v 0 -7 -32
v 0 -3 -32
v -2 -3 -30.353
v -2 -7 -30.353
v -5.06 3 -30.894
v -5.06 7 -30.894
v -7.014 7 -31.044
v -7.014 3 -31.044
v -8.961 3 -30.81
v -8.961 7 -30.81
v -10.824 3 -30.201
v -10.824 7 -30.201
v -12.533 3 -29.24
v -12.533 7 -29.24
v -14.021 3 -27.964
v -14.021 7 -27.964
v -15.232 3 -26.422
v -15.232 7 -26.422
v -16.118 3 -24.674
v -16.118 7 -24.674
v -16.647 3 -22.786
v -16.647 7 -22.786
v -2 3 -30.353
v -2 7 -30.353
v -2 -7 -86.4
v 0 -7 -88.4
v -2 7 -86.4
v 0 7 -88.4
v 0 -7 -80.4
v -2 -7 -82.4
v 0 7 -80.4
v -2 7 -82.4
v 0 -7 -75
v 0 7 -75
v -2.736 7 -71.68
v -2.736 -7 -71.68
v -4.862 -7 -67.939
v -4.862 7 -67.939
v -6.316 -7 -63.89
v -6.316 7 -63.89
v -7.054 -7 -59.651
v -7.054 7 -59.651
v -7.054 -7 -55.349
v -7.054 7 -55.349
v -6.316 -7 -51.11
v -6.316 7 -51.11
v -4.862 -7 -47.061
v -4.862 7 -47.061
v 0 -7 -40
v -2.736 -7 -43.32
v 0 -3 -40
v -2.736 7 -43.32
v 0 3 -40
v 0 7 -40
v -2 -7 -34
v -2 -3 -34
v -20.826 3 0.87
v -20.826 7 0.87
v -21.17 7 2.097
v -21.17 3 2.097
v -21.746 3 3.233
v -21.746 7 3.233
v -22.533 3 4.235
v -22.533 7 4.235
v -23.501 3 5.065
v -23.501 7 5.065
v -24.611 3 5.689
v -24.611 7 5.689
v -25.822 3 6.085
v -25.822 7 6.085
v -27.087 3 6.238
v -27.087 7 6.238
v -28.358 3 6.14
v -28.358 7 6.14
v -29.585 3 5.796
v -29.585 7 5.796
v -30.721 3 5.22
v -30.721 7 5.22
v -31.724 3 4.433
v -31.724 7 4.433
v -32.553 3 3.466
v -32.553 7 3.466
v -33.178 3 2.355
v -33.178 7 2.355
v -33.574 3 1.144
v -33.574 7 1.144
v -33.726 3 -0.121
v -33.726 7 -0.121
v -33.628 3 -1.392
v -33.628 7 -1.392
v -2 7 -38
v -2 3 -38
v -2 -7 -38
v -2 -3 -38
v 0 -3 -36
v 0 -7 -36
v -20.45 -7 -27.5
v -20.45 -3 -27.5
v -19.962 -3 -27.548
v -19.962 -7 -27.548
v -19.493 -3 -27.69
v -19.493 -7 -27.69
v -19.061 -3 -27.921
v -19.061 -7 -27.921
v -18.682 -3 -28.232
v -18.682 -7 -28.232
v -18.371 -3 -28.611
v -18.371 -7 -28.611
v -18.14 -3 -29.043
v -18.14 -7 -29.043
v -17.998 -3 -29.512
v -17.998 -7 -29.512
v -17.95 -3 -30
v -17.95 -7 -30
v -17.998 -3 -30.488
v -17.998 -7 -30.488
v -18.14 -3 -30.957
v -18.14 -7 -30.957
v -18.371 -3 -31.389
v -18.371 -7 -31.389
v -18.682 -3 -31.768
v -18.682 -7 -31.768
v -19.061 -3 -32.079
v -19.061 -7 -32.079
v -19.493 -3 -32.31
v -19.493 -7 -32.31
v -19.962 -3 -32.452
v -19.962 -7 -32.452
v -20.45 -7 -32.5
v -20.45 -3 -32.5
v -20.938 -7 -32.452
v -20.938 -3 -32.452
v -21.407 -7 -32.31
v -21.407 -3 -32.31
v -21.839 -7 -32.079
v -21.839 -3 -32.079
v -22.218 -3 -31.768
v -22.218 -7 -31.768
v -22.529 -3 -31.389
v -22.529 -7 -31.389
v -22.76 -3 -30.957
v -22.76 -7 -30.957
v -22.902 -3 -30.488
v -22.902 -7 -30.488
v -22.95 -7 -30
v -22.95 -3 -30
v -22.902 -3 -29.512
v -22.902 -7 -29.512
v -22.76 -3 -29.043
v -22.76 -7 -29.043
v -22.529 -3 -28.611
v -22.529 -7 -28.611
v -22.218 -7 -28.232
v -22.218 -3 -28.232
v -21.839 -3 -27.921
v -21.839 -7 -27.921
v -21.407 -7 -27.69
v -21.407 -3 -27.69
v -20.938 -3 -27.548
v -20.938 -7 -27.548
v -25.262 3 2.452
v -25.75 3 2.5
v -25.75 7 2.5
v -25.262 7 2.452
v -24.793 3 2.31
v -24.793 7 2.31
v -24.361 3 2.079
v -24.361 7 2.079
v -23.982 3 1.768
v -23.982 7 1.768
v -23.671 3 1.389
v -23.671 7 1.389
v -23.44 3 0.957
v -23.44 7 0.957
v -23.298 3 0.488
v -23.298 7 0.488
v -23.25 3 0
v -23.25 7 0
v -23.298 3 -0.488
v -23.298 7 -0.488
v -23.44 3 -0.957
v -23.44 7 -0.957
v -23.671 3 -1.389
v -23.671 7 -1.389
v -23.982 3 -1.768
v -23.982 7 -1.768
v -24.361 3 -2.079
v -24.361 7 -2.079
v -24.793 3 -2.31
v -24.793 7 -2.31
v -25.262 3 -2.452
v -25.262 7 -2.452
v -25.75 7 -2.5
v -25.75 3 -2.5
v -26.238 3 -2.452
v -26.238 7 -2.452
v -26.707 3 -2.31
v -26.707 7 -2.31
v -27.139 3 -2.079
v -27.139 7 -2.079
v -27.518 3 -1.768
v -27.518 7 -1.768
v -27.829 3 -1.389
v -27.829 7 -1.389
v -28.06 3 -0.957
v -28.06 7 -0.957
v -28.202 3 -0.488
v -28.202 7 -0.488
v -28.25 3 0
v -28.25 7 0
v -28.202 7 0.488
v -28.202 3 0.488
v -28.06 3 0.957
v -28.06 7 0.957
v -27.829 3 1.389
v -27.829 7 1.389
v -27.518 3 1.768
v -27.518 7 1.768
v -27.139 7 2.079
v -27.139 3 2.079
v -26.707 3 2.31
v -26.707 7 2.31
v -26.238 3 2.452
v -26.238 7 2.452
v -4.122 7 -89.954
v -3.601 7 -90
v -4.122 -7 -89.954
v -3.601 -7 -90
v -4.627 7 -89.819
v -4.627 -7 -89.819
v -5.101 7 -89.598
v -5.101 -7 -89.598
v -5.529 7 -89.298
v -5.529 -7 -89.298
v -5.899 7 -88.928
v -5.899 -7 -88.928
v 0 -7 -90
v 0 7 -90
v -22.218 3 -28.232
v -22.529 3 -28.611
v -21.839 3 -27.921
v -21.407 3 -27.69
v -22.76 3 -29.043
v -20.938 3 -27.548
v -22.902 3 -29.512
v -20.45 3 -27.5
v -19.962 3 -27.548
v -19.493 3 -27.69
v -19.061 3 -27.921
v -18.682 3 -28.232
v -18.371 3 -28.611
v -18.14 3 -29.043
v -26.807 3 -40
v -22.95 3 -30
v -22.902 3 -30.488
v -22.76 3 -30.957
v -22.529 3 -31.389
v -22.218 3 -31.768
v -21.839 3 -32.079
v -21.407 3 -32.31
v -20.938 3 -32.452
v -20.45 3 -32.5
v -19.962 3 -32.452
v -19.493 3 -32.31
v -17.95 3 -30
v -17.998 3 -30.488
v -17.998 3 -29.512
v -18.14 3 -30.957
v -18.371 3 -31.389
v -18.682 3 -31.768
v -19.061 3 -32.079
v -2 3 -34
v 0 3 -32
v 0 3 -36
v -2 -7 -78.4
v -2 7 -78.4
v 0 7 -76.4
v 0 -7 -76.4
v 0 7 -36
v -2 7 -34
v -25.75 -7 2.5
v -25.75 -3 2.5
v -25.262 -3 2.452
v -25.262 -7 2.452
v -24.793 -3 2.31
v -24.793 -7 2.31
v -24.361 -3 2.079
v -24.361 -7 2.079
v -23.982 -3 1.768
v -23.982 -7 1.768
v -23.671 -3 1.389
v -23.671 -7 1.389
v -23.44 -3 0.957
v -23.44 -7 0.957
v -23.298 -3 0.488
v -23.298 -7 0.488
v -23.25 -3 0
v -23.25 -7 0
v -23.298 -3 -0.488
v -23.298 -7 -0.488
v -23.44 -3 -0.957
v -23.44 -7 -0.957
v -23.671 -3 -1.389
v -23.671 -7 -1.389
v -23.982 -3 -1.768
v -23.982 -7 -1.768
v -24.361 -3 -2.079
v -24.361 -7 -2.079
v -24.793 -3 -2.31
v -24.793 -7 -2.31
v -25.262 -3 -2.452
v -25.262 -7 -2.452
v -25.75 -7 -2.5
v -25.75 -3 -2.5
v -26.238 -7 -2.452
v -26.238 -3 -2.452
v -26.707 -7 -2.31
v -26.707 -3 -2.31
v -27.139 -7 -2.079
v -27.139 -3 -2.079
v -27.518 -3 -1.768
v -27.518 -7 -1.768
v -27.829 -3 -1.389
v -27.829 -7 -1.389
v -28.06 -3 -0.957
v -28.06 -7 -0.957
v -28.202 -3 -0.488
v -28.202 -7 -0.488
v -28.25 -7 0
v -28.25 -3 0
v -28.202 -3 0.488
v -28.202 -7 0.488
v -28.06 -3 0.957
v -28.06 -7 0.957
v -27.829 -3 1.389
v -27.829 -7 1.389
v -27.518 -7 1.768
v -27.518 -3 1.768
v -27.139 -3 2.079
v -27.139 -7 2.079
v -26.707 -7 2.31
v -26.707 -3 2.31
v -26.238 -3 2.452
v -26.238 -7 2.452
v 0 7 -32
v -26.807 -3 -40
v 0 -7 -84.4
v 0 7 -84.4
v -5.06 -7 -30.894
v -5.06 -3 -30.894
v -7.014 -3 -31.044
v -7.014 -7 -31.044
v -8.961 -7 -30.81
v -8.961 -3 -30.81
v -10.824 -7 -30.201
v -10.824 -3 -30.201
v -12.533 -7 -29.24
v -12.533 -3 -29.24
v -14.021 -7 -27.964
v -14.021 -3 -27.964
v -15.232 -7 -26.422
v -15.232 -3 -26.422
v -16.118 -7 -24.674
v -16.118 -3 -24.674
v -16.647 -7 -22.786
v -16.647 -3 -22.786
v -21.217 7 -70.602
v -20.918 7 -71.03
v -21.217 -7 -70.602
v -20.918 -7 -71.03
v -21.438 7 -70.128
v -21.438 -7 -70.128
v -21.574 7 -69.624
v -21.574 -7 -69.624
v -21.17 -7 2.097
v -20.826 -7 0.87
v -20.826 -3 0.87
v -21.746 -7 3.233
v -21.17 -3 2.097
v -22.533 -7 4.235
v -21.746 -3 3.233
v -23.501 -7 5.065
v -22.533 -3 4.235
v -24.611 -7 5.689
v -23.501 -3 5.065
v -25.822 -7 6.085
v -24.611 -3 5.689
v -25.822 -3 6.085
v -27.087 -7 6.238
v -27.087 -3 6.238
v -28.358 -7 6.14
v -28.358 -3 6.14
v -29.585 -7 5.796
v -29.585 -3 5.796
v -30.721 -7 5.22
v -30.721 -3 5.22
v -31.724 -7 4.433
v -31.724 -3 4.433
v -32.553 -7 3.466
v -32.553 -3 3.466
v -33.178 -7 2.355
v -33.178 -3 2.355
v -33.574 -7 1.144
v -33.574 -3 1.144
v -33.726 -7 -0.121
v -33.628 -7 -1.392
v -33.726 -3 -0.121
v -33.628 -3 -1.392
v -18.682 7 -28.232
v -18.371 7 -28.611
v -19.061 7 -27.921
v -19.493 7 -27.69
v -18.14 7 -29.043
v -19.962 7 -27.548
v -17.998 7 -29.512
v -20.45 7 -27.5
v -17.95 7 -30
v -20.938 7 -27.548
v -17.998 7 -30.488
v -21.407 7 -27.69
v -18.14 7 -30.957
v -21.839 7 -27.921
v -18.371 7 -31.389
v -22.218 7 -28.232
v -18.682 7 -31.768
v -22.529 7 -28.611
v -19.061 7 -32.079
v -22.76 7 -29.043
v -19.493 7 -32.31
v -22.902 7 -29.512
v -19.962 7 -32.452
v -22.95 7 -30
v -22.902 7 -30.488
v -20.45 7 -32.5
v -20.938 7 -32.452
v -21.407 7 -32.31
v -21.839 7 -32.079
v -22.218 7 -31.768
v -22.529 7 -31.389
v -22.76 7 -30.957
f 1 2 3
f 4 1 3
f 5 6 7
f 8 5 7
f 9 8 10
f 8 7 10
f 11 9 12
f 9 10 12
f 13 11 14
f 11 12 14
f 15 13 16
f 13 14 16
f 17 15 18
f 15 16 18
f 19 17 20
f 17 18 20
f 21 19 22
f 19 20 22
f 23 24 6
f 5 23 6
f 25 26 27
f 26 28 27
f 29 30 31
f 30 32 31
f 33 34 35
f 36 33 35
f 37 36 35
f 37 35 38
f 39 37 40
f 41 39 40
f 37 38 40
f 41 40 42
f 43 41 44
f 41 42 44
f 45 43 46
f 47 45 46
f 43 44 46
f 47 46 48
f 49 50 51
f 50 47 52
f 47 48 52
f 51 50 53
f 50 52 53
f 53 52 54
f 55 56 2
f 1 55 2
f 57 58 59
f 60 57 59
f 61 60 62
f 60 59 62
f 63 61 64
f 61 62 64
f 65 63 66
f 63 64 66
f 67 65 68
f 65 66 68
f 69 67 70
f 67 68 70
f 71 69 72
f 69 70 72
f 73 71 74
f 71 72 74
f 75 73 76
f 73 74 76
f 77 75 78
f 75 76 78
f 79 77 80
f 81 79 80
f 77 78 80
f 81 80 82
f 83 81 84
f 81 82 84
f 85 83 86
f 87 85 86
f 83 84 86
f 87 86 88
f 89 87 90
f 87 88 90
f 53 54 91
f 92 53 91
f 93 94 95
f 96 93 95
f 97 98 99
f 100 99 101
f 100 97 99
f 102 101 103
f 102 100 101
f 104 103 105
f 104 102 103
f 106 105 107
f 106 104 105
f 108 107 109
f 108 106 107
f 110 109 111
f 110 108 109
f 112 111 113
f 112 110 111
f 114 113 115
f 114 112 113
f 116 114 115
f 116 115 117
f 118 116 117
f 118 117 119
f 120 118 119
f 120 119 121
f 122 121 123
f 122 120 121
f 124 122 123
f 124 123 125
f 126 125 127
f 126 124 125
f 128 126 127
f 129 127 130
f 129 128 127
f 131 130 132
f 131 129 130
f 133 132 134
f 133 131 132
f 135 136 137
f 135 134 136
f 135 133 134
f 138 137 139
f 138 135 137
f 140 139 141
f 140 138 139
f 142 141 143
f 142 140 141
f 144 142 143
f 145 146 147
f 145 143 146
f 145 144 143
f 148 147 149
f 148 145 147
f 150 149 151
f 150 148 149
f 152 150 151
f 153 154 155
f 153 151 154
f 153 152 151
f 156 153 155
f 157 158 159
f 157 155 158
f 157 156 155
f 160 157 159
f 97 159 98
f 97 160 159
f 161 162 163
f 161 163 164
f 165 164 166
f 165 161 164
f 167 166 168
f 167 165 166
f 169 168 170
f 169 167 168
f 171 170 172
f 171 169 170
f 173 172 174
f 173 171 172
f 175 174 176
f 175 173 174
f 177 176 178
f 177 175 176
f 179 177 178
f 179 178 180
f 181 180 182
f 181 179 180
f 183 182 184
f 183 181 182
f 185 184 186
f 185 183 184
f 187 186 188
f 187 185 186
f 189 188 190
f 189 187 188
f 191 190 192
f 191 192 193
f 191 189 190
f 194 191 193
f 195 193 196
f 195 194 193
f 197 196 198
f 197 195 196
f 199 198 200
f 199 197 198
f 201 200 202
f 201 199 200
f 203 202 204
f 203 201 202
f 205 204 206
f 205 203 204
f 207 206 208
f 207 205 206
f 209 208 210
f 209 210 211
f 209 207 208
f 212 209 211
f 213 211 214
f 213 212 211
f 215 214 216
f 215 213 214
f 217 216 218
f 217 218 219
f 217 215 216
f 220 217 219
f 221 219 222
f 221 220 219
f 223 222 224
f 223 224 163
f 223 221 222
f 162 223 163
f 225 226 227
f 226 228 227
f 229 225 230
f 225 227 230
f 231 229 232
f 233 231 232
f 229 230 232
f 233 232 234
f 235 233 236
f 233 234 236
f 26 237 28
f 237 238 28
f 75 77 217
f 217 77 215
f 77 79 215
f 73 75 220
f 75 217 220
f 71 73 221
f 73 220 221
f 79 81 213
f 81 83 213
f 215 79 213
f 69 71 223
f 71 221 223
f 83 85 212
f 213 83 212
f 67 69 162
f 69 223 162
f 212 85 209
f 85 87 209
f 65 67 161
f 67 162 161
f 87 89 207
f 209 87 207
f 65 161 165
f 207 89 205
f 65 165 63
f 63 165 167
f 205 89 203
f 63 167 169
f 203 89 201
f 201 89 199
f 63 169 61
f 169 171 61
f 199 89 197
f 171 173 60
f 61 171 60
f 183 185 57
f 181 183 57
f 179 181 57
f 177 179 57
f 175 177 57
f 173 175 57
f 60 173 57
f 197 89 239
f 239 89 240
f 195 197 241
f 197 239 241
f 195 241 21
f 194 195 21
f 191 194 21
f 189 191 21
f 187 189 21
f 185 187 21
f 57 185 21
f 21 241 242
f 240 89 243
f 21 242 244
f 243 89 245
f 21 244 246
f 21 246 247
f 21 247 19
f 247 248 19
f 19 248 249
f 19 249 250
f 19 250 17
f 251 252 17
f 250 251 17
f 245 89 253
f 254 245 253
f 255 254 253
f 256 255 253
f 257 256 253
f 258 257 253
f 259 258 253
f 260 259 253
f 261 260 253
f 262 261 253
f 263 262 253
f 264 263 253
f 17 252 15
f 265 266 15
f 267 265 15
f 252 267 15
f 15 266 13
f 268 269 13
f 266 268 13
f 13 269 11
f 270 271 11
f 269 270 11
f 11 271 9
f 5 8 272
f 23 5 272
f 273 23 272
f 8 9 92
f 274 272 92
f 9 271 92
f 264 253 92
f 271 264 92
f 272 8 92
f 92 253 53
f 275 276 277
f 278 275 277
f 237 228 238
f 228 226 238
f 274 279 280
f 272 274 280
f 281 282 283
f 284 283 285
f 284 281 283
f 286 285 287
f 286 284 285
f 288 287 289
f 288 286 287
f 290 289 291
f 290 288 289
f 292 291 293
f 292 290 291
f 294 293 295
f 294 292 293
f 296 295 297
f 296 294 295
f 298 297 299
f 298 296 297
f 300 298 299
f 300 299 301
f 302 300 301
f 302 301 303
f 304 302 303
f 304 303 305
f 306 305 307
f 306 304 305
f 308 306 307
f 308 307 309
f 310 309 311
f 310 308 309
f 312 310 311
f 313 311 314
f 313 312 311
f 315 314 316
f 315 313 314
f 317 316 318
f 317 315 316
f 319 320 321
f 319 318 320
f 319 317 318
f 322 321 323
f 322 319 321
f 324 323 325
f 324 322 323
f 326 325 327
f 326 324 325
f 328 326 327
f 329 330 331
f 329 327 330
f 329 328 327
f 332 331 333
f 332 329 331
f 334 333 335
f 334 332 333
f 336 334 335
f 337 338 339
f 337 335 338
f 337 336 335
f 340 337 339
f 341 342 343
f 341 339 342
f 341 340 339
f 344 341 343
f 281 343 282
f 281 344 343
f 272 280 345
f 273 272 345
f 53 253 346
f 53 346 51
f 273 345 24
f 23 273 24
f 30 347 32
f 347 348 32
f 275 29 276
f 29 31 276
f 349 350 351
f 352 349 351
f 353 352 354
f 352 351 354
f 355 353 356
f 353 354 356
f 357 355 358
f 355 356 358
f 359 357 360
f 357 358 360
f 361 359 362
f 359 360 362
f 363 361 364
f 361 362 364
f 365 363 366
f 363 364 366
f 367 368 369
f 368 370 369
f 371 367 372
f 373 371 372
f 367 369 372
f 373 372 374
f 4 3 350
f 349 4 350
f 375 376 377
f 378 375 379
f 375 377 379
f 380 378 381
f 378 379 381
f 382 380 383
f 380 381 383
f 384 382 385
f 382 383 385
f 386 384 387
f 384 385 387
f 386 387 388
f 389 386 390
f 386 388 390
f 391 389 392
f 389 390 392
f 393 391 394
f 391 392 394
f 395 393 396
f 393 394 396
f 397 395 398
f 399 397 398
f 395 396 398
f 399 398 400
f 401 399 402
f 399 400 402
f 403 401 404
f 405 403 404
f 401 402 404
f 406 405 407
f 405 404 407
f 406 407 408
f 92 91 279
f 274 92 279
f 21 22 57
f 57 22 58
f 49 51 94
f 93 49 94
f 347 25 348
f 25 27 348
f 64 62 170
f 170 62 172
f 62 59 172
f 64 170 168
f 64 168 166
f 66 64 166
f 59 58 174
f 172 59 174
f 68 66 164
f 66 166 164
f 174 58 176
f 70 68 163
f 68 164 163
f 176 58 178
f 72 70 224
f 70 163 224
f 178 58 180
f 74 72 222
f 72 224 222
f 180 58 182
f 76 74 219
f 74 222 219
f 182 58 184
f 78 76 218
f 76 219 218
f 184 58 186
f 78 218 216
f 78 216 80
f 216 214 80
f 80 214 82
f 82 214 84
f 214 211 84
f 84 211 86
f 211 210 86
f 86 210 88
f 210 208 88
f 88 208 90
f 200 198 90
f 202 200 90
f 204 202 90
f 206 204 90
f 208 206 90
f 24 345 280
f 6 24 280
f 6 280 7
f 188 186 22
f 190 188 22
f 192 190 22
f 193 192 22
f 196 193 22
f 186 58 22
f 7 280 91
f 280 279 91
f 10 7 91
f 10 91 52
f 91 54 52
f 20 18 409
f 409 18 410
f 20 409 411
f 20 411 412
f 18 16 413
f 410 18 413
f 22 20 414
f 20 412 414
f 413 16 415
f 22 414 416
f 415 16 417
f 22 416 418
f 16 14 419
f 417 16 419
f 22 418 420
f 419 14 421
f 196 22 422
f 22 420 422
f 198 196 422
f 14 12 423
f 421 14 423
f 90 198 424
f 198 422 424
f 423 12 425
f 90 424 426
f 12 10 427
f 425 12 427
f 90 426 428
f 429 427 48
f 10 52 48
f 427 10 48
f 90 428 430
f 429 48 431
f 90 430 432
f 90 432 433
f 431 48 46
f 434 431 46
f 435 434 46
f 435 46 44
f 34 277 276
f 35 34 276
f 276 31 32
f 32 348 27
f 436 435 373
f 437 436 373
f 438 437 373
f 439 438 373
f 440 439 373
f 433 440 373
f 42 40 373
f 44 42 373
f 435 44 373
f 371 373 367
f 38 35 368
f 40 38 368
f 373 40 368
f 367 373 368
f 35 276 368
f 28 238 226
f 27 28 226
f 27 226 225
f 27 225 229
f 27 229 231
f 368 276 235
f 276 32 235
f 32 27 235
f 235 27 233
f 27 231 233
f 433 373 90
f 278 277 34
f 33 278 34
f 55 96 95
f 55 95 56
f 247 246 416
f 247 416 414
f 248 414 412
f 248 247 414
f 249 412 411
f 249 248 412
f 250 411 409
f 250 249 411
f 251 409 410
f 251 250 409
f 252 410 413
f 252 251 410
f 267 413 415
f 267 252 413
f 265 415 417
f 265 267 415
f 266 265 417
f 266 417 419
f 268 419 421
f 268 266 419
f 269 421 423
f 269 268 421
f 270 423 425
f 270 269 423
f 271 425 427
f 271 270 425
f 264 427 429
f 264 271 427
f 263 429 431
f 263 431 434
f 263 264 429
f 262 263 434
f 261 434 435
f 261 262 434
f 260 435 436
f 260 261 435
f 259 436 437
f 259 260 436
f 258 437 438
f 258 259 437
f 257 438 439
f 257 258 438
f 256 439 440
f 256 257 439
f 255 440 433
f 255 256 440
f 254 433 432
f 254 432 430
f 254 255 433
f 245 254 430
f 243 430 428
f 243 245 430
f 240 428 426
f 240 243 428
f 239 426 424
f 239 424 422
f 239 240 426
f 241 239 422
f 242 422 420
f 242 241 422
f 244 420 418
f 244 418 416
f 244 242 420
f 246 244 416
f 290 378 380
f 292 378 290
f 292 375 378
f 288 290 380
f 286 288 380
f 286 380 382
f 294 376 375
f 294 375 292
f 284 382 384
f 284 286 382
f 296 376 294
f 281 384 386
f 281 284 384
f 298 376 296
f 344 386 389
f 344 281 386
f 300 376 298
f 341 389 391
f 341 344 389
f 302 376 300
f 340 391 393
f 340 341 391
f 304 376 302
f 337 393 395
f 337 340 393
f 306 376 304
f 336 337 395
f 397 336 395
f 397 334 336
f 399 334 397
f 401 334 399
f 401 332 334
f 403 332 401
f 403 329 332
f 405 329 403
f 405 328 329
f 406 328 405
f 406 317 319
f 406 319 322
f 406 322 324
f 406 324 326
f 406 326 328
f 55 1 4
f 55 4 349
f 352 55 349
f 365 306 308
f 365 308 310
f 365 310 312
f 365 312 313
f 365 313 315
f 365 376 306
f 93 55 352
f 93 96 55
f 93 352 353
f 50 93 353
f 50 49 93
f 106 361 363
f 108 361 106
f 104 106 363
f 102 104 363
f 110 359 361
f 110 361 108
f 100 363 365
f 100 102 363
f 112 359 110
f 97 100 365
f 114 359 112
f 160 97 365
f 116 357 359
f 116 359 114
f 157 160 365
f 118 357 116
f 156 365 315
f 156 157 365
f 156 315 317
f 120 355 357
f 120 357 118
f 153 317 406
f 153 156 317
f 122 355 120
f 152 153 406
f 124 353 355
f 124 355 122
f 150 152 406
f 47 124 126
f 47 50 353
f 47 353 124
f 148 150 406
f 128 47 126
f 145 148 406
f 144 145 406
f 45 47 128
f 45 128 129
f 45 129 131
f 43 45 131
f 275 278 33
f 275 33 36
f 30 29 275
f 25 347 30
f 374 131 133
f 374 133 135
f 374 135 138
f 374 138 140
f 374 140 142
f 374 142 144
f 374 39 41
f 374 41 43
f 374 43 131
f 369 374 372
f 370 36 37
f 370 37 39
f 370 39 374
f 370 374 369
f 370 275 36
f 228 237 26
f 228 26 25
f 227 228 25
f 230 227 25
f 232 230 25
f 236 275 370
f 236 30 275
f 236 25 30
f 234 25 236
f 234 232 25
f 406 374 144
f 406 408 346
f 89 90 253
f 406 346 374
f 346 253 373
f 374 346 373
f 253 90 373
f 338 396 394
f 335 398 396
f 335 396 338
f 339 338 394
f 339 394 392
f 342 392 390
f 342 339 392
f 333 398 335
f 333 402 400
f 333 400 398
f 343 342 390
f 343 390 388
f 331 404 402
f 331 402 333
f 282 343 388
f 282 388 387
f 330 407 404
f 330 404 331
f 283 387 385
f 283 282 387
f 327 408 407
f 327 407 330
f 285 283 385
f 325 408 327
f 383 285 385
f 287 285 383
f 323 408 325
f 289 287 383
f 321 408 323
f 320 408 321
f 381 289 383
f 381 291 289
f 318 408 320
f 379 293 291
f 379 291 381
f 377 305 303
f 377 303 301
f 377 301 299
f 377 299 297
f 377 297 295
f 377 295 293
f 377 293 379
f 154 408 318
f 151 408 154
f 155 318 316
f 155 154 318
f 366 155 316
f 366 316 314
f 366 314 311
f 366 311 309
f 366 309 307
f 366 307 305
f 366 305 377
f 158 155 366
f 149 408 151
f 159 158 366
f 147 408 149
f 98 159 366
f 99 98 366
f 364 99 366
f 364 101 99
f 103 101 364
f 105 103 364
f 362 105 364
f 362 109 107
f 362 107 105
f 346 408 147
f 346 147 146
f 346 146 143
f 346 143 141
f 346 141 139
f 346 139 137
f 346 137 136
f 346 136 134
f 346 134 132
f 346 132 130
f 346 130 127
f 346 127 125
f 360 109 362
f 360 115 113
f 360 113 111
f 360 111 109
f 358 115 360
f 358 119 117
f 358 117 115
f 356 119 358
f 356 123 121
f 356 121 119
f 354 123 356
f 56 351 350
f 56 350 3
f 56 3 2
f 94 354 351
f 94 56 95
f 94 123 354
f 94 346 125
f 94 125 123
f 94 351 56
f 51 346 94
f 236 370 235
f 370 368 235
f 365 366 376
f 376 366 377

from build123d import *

# Parameters (mm, degrees)
SKETCH1_R              = 2.5
BOSS_EXTRUDE1_DEPTH    = 7
CUT_EXTRUDE1_START     = -40
CUT_EXTRUDE1_OUTLINE_W = 34.803170534
CUT_EXTRUDE1_OUTLINE_H = 6
CUT_EXTRUDE1_DEPTH     = 46.239041119
FILLET1_R              = 3


# Read off the part's stored shape, not the designer's step: Cut-Extrude1
with BuildPart() as part:
    # Sketch1 → Boss-Extrude1 (new, symmetric)
    with BuildSketch(Plane(origin=(0, 0, 0), x_dir=(1, 0, 0), z_dir=(0, 1, 0))):
        with BuildLine():
            Line((-16.647024265, 22.786117759), (-20.826247522, -0.869862938))
            ThreePointArc((-20.826247522, -0.869862938), (-28.357947563, -6.139919341), (-33.628003966, 1.391780701))
            Line((-33.628003966, 1.391780701), (-21.433938056, 70.414795281))
            Line((-21.433938056, 70.414795281), (-5, 90))
            Line((-5, 90), (0, 90))
            Line((0, 90), (0, 88.40012962))
            Line((0, 88.40012962), (-2, 86.400129391))
            Line((-2, 86.400129391), (0, 84.40012962))
            Line((0, 84.40012962), (-2, 82.400129391))
            Line((-2, 82.400129391), (0, 80.40012962))
            Line((0, 80.40012962), (-2, 78.400129391))
            Line((-2, 78.400129391), (0, 76.40012962))
            Line((0, 76.40012962), (0, 75))
            ThreePointArc((0, 75), (-7.146428929, 57.5), (0, 40))
            Line((0, 40), (-2, 38.00000006))
            Line((-2, 38.00000006), (0, 36))
            Line((0, 36), (-2, 34.00000006))
            Line((-2, 34.00000006), (0, 32))
            Line((0, 32), (-2, 30.353333333))
            Line((-2, 30.353333333), (-5.059793432, 30.89389684))
            ThreePointArc((-5.059793432, 30.89389684), (-12.532584877, 29.23980138), (-16.647024265, 22.786117759))
        make_face()
        with Locations(Location((-25.75, 0, 0), (0, 0, 270))):
            Circle(SKETCH1_R, mode=Mode.SUBTRACT)
        with Locations(Location((-20.45, 30, 0), (0, 0, 270))):
            Circle(SKETCH1_R, mode=Mode.SUBTRACT)
    extrude(amount=BOSS_EXTRUDE1_DEPTH, both=True)

    # Cut-Extrude1 outline → Cut-Extrude1 (cut)
    with BuildSketch(Plane.XY.offset(CUT_EXTRUDE1_START)):
        with Locations((-17.401585267, 0)):
            Rectangle(CUT_EXTRUDE1_OUTLINE_W, CUT_EXTRUDE1_OUTLINE_H)
    extrude(amount=CUT_EXTRUDE1_DEPTH, mode=Mode.SUBTRACT)

    # Fillet1
    fillet1_edges = [part.edges().sort_by_distance(p)[0] for p in [
        (-21.433938056, 0, -70.414795281),
        (-5, 0, -90),
    ]]
    fillet(fillet1_edges, radius=FILLET1_R)


solid = part.part
